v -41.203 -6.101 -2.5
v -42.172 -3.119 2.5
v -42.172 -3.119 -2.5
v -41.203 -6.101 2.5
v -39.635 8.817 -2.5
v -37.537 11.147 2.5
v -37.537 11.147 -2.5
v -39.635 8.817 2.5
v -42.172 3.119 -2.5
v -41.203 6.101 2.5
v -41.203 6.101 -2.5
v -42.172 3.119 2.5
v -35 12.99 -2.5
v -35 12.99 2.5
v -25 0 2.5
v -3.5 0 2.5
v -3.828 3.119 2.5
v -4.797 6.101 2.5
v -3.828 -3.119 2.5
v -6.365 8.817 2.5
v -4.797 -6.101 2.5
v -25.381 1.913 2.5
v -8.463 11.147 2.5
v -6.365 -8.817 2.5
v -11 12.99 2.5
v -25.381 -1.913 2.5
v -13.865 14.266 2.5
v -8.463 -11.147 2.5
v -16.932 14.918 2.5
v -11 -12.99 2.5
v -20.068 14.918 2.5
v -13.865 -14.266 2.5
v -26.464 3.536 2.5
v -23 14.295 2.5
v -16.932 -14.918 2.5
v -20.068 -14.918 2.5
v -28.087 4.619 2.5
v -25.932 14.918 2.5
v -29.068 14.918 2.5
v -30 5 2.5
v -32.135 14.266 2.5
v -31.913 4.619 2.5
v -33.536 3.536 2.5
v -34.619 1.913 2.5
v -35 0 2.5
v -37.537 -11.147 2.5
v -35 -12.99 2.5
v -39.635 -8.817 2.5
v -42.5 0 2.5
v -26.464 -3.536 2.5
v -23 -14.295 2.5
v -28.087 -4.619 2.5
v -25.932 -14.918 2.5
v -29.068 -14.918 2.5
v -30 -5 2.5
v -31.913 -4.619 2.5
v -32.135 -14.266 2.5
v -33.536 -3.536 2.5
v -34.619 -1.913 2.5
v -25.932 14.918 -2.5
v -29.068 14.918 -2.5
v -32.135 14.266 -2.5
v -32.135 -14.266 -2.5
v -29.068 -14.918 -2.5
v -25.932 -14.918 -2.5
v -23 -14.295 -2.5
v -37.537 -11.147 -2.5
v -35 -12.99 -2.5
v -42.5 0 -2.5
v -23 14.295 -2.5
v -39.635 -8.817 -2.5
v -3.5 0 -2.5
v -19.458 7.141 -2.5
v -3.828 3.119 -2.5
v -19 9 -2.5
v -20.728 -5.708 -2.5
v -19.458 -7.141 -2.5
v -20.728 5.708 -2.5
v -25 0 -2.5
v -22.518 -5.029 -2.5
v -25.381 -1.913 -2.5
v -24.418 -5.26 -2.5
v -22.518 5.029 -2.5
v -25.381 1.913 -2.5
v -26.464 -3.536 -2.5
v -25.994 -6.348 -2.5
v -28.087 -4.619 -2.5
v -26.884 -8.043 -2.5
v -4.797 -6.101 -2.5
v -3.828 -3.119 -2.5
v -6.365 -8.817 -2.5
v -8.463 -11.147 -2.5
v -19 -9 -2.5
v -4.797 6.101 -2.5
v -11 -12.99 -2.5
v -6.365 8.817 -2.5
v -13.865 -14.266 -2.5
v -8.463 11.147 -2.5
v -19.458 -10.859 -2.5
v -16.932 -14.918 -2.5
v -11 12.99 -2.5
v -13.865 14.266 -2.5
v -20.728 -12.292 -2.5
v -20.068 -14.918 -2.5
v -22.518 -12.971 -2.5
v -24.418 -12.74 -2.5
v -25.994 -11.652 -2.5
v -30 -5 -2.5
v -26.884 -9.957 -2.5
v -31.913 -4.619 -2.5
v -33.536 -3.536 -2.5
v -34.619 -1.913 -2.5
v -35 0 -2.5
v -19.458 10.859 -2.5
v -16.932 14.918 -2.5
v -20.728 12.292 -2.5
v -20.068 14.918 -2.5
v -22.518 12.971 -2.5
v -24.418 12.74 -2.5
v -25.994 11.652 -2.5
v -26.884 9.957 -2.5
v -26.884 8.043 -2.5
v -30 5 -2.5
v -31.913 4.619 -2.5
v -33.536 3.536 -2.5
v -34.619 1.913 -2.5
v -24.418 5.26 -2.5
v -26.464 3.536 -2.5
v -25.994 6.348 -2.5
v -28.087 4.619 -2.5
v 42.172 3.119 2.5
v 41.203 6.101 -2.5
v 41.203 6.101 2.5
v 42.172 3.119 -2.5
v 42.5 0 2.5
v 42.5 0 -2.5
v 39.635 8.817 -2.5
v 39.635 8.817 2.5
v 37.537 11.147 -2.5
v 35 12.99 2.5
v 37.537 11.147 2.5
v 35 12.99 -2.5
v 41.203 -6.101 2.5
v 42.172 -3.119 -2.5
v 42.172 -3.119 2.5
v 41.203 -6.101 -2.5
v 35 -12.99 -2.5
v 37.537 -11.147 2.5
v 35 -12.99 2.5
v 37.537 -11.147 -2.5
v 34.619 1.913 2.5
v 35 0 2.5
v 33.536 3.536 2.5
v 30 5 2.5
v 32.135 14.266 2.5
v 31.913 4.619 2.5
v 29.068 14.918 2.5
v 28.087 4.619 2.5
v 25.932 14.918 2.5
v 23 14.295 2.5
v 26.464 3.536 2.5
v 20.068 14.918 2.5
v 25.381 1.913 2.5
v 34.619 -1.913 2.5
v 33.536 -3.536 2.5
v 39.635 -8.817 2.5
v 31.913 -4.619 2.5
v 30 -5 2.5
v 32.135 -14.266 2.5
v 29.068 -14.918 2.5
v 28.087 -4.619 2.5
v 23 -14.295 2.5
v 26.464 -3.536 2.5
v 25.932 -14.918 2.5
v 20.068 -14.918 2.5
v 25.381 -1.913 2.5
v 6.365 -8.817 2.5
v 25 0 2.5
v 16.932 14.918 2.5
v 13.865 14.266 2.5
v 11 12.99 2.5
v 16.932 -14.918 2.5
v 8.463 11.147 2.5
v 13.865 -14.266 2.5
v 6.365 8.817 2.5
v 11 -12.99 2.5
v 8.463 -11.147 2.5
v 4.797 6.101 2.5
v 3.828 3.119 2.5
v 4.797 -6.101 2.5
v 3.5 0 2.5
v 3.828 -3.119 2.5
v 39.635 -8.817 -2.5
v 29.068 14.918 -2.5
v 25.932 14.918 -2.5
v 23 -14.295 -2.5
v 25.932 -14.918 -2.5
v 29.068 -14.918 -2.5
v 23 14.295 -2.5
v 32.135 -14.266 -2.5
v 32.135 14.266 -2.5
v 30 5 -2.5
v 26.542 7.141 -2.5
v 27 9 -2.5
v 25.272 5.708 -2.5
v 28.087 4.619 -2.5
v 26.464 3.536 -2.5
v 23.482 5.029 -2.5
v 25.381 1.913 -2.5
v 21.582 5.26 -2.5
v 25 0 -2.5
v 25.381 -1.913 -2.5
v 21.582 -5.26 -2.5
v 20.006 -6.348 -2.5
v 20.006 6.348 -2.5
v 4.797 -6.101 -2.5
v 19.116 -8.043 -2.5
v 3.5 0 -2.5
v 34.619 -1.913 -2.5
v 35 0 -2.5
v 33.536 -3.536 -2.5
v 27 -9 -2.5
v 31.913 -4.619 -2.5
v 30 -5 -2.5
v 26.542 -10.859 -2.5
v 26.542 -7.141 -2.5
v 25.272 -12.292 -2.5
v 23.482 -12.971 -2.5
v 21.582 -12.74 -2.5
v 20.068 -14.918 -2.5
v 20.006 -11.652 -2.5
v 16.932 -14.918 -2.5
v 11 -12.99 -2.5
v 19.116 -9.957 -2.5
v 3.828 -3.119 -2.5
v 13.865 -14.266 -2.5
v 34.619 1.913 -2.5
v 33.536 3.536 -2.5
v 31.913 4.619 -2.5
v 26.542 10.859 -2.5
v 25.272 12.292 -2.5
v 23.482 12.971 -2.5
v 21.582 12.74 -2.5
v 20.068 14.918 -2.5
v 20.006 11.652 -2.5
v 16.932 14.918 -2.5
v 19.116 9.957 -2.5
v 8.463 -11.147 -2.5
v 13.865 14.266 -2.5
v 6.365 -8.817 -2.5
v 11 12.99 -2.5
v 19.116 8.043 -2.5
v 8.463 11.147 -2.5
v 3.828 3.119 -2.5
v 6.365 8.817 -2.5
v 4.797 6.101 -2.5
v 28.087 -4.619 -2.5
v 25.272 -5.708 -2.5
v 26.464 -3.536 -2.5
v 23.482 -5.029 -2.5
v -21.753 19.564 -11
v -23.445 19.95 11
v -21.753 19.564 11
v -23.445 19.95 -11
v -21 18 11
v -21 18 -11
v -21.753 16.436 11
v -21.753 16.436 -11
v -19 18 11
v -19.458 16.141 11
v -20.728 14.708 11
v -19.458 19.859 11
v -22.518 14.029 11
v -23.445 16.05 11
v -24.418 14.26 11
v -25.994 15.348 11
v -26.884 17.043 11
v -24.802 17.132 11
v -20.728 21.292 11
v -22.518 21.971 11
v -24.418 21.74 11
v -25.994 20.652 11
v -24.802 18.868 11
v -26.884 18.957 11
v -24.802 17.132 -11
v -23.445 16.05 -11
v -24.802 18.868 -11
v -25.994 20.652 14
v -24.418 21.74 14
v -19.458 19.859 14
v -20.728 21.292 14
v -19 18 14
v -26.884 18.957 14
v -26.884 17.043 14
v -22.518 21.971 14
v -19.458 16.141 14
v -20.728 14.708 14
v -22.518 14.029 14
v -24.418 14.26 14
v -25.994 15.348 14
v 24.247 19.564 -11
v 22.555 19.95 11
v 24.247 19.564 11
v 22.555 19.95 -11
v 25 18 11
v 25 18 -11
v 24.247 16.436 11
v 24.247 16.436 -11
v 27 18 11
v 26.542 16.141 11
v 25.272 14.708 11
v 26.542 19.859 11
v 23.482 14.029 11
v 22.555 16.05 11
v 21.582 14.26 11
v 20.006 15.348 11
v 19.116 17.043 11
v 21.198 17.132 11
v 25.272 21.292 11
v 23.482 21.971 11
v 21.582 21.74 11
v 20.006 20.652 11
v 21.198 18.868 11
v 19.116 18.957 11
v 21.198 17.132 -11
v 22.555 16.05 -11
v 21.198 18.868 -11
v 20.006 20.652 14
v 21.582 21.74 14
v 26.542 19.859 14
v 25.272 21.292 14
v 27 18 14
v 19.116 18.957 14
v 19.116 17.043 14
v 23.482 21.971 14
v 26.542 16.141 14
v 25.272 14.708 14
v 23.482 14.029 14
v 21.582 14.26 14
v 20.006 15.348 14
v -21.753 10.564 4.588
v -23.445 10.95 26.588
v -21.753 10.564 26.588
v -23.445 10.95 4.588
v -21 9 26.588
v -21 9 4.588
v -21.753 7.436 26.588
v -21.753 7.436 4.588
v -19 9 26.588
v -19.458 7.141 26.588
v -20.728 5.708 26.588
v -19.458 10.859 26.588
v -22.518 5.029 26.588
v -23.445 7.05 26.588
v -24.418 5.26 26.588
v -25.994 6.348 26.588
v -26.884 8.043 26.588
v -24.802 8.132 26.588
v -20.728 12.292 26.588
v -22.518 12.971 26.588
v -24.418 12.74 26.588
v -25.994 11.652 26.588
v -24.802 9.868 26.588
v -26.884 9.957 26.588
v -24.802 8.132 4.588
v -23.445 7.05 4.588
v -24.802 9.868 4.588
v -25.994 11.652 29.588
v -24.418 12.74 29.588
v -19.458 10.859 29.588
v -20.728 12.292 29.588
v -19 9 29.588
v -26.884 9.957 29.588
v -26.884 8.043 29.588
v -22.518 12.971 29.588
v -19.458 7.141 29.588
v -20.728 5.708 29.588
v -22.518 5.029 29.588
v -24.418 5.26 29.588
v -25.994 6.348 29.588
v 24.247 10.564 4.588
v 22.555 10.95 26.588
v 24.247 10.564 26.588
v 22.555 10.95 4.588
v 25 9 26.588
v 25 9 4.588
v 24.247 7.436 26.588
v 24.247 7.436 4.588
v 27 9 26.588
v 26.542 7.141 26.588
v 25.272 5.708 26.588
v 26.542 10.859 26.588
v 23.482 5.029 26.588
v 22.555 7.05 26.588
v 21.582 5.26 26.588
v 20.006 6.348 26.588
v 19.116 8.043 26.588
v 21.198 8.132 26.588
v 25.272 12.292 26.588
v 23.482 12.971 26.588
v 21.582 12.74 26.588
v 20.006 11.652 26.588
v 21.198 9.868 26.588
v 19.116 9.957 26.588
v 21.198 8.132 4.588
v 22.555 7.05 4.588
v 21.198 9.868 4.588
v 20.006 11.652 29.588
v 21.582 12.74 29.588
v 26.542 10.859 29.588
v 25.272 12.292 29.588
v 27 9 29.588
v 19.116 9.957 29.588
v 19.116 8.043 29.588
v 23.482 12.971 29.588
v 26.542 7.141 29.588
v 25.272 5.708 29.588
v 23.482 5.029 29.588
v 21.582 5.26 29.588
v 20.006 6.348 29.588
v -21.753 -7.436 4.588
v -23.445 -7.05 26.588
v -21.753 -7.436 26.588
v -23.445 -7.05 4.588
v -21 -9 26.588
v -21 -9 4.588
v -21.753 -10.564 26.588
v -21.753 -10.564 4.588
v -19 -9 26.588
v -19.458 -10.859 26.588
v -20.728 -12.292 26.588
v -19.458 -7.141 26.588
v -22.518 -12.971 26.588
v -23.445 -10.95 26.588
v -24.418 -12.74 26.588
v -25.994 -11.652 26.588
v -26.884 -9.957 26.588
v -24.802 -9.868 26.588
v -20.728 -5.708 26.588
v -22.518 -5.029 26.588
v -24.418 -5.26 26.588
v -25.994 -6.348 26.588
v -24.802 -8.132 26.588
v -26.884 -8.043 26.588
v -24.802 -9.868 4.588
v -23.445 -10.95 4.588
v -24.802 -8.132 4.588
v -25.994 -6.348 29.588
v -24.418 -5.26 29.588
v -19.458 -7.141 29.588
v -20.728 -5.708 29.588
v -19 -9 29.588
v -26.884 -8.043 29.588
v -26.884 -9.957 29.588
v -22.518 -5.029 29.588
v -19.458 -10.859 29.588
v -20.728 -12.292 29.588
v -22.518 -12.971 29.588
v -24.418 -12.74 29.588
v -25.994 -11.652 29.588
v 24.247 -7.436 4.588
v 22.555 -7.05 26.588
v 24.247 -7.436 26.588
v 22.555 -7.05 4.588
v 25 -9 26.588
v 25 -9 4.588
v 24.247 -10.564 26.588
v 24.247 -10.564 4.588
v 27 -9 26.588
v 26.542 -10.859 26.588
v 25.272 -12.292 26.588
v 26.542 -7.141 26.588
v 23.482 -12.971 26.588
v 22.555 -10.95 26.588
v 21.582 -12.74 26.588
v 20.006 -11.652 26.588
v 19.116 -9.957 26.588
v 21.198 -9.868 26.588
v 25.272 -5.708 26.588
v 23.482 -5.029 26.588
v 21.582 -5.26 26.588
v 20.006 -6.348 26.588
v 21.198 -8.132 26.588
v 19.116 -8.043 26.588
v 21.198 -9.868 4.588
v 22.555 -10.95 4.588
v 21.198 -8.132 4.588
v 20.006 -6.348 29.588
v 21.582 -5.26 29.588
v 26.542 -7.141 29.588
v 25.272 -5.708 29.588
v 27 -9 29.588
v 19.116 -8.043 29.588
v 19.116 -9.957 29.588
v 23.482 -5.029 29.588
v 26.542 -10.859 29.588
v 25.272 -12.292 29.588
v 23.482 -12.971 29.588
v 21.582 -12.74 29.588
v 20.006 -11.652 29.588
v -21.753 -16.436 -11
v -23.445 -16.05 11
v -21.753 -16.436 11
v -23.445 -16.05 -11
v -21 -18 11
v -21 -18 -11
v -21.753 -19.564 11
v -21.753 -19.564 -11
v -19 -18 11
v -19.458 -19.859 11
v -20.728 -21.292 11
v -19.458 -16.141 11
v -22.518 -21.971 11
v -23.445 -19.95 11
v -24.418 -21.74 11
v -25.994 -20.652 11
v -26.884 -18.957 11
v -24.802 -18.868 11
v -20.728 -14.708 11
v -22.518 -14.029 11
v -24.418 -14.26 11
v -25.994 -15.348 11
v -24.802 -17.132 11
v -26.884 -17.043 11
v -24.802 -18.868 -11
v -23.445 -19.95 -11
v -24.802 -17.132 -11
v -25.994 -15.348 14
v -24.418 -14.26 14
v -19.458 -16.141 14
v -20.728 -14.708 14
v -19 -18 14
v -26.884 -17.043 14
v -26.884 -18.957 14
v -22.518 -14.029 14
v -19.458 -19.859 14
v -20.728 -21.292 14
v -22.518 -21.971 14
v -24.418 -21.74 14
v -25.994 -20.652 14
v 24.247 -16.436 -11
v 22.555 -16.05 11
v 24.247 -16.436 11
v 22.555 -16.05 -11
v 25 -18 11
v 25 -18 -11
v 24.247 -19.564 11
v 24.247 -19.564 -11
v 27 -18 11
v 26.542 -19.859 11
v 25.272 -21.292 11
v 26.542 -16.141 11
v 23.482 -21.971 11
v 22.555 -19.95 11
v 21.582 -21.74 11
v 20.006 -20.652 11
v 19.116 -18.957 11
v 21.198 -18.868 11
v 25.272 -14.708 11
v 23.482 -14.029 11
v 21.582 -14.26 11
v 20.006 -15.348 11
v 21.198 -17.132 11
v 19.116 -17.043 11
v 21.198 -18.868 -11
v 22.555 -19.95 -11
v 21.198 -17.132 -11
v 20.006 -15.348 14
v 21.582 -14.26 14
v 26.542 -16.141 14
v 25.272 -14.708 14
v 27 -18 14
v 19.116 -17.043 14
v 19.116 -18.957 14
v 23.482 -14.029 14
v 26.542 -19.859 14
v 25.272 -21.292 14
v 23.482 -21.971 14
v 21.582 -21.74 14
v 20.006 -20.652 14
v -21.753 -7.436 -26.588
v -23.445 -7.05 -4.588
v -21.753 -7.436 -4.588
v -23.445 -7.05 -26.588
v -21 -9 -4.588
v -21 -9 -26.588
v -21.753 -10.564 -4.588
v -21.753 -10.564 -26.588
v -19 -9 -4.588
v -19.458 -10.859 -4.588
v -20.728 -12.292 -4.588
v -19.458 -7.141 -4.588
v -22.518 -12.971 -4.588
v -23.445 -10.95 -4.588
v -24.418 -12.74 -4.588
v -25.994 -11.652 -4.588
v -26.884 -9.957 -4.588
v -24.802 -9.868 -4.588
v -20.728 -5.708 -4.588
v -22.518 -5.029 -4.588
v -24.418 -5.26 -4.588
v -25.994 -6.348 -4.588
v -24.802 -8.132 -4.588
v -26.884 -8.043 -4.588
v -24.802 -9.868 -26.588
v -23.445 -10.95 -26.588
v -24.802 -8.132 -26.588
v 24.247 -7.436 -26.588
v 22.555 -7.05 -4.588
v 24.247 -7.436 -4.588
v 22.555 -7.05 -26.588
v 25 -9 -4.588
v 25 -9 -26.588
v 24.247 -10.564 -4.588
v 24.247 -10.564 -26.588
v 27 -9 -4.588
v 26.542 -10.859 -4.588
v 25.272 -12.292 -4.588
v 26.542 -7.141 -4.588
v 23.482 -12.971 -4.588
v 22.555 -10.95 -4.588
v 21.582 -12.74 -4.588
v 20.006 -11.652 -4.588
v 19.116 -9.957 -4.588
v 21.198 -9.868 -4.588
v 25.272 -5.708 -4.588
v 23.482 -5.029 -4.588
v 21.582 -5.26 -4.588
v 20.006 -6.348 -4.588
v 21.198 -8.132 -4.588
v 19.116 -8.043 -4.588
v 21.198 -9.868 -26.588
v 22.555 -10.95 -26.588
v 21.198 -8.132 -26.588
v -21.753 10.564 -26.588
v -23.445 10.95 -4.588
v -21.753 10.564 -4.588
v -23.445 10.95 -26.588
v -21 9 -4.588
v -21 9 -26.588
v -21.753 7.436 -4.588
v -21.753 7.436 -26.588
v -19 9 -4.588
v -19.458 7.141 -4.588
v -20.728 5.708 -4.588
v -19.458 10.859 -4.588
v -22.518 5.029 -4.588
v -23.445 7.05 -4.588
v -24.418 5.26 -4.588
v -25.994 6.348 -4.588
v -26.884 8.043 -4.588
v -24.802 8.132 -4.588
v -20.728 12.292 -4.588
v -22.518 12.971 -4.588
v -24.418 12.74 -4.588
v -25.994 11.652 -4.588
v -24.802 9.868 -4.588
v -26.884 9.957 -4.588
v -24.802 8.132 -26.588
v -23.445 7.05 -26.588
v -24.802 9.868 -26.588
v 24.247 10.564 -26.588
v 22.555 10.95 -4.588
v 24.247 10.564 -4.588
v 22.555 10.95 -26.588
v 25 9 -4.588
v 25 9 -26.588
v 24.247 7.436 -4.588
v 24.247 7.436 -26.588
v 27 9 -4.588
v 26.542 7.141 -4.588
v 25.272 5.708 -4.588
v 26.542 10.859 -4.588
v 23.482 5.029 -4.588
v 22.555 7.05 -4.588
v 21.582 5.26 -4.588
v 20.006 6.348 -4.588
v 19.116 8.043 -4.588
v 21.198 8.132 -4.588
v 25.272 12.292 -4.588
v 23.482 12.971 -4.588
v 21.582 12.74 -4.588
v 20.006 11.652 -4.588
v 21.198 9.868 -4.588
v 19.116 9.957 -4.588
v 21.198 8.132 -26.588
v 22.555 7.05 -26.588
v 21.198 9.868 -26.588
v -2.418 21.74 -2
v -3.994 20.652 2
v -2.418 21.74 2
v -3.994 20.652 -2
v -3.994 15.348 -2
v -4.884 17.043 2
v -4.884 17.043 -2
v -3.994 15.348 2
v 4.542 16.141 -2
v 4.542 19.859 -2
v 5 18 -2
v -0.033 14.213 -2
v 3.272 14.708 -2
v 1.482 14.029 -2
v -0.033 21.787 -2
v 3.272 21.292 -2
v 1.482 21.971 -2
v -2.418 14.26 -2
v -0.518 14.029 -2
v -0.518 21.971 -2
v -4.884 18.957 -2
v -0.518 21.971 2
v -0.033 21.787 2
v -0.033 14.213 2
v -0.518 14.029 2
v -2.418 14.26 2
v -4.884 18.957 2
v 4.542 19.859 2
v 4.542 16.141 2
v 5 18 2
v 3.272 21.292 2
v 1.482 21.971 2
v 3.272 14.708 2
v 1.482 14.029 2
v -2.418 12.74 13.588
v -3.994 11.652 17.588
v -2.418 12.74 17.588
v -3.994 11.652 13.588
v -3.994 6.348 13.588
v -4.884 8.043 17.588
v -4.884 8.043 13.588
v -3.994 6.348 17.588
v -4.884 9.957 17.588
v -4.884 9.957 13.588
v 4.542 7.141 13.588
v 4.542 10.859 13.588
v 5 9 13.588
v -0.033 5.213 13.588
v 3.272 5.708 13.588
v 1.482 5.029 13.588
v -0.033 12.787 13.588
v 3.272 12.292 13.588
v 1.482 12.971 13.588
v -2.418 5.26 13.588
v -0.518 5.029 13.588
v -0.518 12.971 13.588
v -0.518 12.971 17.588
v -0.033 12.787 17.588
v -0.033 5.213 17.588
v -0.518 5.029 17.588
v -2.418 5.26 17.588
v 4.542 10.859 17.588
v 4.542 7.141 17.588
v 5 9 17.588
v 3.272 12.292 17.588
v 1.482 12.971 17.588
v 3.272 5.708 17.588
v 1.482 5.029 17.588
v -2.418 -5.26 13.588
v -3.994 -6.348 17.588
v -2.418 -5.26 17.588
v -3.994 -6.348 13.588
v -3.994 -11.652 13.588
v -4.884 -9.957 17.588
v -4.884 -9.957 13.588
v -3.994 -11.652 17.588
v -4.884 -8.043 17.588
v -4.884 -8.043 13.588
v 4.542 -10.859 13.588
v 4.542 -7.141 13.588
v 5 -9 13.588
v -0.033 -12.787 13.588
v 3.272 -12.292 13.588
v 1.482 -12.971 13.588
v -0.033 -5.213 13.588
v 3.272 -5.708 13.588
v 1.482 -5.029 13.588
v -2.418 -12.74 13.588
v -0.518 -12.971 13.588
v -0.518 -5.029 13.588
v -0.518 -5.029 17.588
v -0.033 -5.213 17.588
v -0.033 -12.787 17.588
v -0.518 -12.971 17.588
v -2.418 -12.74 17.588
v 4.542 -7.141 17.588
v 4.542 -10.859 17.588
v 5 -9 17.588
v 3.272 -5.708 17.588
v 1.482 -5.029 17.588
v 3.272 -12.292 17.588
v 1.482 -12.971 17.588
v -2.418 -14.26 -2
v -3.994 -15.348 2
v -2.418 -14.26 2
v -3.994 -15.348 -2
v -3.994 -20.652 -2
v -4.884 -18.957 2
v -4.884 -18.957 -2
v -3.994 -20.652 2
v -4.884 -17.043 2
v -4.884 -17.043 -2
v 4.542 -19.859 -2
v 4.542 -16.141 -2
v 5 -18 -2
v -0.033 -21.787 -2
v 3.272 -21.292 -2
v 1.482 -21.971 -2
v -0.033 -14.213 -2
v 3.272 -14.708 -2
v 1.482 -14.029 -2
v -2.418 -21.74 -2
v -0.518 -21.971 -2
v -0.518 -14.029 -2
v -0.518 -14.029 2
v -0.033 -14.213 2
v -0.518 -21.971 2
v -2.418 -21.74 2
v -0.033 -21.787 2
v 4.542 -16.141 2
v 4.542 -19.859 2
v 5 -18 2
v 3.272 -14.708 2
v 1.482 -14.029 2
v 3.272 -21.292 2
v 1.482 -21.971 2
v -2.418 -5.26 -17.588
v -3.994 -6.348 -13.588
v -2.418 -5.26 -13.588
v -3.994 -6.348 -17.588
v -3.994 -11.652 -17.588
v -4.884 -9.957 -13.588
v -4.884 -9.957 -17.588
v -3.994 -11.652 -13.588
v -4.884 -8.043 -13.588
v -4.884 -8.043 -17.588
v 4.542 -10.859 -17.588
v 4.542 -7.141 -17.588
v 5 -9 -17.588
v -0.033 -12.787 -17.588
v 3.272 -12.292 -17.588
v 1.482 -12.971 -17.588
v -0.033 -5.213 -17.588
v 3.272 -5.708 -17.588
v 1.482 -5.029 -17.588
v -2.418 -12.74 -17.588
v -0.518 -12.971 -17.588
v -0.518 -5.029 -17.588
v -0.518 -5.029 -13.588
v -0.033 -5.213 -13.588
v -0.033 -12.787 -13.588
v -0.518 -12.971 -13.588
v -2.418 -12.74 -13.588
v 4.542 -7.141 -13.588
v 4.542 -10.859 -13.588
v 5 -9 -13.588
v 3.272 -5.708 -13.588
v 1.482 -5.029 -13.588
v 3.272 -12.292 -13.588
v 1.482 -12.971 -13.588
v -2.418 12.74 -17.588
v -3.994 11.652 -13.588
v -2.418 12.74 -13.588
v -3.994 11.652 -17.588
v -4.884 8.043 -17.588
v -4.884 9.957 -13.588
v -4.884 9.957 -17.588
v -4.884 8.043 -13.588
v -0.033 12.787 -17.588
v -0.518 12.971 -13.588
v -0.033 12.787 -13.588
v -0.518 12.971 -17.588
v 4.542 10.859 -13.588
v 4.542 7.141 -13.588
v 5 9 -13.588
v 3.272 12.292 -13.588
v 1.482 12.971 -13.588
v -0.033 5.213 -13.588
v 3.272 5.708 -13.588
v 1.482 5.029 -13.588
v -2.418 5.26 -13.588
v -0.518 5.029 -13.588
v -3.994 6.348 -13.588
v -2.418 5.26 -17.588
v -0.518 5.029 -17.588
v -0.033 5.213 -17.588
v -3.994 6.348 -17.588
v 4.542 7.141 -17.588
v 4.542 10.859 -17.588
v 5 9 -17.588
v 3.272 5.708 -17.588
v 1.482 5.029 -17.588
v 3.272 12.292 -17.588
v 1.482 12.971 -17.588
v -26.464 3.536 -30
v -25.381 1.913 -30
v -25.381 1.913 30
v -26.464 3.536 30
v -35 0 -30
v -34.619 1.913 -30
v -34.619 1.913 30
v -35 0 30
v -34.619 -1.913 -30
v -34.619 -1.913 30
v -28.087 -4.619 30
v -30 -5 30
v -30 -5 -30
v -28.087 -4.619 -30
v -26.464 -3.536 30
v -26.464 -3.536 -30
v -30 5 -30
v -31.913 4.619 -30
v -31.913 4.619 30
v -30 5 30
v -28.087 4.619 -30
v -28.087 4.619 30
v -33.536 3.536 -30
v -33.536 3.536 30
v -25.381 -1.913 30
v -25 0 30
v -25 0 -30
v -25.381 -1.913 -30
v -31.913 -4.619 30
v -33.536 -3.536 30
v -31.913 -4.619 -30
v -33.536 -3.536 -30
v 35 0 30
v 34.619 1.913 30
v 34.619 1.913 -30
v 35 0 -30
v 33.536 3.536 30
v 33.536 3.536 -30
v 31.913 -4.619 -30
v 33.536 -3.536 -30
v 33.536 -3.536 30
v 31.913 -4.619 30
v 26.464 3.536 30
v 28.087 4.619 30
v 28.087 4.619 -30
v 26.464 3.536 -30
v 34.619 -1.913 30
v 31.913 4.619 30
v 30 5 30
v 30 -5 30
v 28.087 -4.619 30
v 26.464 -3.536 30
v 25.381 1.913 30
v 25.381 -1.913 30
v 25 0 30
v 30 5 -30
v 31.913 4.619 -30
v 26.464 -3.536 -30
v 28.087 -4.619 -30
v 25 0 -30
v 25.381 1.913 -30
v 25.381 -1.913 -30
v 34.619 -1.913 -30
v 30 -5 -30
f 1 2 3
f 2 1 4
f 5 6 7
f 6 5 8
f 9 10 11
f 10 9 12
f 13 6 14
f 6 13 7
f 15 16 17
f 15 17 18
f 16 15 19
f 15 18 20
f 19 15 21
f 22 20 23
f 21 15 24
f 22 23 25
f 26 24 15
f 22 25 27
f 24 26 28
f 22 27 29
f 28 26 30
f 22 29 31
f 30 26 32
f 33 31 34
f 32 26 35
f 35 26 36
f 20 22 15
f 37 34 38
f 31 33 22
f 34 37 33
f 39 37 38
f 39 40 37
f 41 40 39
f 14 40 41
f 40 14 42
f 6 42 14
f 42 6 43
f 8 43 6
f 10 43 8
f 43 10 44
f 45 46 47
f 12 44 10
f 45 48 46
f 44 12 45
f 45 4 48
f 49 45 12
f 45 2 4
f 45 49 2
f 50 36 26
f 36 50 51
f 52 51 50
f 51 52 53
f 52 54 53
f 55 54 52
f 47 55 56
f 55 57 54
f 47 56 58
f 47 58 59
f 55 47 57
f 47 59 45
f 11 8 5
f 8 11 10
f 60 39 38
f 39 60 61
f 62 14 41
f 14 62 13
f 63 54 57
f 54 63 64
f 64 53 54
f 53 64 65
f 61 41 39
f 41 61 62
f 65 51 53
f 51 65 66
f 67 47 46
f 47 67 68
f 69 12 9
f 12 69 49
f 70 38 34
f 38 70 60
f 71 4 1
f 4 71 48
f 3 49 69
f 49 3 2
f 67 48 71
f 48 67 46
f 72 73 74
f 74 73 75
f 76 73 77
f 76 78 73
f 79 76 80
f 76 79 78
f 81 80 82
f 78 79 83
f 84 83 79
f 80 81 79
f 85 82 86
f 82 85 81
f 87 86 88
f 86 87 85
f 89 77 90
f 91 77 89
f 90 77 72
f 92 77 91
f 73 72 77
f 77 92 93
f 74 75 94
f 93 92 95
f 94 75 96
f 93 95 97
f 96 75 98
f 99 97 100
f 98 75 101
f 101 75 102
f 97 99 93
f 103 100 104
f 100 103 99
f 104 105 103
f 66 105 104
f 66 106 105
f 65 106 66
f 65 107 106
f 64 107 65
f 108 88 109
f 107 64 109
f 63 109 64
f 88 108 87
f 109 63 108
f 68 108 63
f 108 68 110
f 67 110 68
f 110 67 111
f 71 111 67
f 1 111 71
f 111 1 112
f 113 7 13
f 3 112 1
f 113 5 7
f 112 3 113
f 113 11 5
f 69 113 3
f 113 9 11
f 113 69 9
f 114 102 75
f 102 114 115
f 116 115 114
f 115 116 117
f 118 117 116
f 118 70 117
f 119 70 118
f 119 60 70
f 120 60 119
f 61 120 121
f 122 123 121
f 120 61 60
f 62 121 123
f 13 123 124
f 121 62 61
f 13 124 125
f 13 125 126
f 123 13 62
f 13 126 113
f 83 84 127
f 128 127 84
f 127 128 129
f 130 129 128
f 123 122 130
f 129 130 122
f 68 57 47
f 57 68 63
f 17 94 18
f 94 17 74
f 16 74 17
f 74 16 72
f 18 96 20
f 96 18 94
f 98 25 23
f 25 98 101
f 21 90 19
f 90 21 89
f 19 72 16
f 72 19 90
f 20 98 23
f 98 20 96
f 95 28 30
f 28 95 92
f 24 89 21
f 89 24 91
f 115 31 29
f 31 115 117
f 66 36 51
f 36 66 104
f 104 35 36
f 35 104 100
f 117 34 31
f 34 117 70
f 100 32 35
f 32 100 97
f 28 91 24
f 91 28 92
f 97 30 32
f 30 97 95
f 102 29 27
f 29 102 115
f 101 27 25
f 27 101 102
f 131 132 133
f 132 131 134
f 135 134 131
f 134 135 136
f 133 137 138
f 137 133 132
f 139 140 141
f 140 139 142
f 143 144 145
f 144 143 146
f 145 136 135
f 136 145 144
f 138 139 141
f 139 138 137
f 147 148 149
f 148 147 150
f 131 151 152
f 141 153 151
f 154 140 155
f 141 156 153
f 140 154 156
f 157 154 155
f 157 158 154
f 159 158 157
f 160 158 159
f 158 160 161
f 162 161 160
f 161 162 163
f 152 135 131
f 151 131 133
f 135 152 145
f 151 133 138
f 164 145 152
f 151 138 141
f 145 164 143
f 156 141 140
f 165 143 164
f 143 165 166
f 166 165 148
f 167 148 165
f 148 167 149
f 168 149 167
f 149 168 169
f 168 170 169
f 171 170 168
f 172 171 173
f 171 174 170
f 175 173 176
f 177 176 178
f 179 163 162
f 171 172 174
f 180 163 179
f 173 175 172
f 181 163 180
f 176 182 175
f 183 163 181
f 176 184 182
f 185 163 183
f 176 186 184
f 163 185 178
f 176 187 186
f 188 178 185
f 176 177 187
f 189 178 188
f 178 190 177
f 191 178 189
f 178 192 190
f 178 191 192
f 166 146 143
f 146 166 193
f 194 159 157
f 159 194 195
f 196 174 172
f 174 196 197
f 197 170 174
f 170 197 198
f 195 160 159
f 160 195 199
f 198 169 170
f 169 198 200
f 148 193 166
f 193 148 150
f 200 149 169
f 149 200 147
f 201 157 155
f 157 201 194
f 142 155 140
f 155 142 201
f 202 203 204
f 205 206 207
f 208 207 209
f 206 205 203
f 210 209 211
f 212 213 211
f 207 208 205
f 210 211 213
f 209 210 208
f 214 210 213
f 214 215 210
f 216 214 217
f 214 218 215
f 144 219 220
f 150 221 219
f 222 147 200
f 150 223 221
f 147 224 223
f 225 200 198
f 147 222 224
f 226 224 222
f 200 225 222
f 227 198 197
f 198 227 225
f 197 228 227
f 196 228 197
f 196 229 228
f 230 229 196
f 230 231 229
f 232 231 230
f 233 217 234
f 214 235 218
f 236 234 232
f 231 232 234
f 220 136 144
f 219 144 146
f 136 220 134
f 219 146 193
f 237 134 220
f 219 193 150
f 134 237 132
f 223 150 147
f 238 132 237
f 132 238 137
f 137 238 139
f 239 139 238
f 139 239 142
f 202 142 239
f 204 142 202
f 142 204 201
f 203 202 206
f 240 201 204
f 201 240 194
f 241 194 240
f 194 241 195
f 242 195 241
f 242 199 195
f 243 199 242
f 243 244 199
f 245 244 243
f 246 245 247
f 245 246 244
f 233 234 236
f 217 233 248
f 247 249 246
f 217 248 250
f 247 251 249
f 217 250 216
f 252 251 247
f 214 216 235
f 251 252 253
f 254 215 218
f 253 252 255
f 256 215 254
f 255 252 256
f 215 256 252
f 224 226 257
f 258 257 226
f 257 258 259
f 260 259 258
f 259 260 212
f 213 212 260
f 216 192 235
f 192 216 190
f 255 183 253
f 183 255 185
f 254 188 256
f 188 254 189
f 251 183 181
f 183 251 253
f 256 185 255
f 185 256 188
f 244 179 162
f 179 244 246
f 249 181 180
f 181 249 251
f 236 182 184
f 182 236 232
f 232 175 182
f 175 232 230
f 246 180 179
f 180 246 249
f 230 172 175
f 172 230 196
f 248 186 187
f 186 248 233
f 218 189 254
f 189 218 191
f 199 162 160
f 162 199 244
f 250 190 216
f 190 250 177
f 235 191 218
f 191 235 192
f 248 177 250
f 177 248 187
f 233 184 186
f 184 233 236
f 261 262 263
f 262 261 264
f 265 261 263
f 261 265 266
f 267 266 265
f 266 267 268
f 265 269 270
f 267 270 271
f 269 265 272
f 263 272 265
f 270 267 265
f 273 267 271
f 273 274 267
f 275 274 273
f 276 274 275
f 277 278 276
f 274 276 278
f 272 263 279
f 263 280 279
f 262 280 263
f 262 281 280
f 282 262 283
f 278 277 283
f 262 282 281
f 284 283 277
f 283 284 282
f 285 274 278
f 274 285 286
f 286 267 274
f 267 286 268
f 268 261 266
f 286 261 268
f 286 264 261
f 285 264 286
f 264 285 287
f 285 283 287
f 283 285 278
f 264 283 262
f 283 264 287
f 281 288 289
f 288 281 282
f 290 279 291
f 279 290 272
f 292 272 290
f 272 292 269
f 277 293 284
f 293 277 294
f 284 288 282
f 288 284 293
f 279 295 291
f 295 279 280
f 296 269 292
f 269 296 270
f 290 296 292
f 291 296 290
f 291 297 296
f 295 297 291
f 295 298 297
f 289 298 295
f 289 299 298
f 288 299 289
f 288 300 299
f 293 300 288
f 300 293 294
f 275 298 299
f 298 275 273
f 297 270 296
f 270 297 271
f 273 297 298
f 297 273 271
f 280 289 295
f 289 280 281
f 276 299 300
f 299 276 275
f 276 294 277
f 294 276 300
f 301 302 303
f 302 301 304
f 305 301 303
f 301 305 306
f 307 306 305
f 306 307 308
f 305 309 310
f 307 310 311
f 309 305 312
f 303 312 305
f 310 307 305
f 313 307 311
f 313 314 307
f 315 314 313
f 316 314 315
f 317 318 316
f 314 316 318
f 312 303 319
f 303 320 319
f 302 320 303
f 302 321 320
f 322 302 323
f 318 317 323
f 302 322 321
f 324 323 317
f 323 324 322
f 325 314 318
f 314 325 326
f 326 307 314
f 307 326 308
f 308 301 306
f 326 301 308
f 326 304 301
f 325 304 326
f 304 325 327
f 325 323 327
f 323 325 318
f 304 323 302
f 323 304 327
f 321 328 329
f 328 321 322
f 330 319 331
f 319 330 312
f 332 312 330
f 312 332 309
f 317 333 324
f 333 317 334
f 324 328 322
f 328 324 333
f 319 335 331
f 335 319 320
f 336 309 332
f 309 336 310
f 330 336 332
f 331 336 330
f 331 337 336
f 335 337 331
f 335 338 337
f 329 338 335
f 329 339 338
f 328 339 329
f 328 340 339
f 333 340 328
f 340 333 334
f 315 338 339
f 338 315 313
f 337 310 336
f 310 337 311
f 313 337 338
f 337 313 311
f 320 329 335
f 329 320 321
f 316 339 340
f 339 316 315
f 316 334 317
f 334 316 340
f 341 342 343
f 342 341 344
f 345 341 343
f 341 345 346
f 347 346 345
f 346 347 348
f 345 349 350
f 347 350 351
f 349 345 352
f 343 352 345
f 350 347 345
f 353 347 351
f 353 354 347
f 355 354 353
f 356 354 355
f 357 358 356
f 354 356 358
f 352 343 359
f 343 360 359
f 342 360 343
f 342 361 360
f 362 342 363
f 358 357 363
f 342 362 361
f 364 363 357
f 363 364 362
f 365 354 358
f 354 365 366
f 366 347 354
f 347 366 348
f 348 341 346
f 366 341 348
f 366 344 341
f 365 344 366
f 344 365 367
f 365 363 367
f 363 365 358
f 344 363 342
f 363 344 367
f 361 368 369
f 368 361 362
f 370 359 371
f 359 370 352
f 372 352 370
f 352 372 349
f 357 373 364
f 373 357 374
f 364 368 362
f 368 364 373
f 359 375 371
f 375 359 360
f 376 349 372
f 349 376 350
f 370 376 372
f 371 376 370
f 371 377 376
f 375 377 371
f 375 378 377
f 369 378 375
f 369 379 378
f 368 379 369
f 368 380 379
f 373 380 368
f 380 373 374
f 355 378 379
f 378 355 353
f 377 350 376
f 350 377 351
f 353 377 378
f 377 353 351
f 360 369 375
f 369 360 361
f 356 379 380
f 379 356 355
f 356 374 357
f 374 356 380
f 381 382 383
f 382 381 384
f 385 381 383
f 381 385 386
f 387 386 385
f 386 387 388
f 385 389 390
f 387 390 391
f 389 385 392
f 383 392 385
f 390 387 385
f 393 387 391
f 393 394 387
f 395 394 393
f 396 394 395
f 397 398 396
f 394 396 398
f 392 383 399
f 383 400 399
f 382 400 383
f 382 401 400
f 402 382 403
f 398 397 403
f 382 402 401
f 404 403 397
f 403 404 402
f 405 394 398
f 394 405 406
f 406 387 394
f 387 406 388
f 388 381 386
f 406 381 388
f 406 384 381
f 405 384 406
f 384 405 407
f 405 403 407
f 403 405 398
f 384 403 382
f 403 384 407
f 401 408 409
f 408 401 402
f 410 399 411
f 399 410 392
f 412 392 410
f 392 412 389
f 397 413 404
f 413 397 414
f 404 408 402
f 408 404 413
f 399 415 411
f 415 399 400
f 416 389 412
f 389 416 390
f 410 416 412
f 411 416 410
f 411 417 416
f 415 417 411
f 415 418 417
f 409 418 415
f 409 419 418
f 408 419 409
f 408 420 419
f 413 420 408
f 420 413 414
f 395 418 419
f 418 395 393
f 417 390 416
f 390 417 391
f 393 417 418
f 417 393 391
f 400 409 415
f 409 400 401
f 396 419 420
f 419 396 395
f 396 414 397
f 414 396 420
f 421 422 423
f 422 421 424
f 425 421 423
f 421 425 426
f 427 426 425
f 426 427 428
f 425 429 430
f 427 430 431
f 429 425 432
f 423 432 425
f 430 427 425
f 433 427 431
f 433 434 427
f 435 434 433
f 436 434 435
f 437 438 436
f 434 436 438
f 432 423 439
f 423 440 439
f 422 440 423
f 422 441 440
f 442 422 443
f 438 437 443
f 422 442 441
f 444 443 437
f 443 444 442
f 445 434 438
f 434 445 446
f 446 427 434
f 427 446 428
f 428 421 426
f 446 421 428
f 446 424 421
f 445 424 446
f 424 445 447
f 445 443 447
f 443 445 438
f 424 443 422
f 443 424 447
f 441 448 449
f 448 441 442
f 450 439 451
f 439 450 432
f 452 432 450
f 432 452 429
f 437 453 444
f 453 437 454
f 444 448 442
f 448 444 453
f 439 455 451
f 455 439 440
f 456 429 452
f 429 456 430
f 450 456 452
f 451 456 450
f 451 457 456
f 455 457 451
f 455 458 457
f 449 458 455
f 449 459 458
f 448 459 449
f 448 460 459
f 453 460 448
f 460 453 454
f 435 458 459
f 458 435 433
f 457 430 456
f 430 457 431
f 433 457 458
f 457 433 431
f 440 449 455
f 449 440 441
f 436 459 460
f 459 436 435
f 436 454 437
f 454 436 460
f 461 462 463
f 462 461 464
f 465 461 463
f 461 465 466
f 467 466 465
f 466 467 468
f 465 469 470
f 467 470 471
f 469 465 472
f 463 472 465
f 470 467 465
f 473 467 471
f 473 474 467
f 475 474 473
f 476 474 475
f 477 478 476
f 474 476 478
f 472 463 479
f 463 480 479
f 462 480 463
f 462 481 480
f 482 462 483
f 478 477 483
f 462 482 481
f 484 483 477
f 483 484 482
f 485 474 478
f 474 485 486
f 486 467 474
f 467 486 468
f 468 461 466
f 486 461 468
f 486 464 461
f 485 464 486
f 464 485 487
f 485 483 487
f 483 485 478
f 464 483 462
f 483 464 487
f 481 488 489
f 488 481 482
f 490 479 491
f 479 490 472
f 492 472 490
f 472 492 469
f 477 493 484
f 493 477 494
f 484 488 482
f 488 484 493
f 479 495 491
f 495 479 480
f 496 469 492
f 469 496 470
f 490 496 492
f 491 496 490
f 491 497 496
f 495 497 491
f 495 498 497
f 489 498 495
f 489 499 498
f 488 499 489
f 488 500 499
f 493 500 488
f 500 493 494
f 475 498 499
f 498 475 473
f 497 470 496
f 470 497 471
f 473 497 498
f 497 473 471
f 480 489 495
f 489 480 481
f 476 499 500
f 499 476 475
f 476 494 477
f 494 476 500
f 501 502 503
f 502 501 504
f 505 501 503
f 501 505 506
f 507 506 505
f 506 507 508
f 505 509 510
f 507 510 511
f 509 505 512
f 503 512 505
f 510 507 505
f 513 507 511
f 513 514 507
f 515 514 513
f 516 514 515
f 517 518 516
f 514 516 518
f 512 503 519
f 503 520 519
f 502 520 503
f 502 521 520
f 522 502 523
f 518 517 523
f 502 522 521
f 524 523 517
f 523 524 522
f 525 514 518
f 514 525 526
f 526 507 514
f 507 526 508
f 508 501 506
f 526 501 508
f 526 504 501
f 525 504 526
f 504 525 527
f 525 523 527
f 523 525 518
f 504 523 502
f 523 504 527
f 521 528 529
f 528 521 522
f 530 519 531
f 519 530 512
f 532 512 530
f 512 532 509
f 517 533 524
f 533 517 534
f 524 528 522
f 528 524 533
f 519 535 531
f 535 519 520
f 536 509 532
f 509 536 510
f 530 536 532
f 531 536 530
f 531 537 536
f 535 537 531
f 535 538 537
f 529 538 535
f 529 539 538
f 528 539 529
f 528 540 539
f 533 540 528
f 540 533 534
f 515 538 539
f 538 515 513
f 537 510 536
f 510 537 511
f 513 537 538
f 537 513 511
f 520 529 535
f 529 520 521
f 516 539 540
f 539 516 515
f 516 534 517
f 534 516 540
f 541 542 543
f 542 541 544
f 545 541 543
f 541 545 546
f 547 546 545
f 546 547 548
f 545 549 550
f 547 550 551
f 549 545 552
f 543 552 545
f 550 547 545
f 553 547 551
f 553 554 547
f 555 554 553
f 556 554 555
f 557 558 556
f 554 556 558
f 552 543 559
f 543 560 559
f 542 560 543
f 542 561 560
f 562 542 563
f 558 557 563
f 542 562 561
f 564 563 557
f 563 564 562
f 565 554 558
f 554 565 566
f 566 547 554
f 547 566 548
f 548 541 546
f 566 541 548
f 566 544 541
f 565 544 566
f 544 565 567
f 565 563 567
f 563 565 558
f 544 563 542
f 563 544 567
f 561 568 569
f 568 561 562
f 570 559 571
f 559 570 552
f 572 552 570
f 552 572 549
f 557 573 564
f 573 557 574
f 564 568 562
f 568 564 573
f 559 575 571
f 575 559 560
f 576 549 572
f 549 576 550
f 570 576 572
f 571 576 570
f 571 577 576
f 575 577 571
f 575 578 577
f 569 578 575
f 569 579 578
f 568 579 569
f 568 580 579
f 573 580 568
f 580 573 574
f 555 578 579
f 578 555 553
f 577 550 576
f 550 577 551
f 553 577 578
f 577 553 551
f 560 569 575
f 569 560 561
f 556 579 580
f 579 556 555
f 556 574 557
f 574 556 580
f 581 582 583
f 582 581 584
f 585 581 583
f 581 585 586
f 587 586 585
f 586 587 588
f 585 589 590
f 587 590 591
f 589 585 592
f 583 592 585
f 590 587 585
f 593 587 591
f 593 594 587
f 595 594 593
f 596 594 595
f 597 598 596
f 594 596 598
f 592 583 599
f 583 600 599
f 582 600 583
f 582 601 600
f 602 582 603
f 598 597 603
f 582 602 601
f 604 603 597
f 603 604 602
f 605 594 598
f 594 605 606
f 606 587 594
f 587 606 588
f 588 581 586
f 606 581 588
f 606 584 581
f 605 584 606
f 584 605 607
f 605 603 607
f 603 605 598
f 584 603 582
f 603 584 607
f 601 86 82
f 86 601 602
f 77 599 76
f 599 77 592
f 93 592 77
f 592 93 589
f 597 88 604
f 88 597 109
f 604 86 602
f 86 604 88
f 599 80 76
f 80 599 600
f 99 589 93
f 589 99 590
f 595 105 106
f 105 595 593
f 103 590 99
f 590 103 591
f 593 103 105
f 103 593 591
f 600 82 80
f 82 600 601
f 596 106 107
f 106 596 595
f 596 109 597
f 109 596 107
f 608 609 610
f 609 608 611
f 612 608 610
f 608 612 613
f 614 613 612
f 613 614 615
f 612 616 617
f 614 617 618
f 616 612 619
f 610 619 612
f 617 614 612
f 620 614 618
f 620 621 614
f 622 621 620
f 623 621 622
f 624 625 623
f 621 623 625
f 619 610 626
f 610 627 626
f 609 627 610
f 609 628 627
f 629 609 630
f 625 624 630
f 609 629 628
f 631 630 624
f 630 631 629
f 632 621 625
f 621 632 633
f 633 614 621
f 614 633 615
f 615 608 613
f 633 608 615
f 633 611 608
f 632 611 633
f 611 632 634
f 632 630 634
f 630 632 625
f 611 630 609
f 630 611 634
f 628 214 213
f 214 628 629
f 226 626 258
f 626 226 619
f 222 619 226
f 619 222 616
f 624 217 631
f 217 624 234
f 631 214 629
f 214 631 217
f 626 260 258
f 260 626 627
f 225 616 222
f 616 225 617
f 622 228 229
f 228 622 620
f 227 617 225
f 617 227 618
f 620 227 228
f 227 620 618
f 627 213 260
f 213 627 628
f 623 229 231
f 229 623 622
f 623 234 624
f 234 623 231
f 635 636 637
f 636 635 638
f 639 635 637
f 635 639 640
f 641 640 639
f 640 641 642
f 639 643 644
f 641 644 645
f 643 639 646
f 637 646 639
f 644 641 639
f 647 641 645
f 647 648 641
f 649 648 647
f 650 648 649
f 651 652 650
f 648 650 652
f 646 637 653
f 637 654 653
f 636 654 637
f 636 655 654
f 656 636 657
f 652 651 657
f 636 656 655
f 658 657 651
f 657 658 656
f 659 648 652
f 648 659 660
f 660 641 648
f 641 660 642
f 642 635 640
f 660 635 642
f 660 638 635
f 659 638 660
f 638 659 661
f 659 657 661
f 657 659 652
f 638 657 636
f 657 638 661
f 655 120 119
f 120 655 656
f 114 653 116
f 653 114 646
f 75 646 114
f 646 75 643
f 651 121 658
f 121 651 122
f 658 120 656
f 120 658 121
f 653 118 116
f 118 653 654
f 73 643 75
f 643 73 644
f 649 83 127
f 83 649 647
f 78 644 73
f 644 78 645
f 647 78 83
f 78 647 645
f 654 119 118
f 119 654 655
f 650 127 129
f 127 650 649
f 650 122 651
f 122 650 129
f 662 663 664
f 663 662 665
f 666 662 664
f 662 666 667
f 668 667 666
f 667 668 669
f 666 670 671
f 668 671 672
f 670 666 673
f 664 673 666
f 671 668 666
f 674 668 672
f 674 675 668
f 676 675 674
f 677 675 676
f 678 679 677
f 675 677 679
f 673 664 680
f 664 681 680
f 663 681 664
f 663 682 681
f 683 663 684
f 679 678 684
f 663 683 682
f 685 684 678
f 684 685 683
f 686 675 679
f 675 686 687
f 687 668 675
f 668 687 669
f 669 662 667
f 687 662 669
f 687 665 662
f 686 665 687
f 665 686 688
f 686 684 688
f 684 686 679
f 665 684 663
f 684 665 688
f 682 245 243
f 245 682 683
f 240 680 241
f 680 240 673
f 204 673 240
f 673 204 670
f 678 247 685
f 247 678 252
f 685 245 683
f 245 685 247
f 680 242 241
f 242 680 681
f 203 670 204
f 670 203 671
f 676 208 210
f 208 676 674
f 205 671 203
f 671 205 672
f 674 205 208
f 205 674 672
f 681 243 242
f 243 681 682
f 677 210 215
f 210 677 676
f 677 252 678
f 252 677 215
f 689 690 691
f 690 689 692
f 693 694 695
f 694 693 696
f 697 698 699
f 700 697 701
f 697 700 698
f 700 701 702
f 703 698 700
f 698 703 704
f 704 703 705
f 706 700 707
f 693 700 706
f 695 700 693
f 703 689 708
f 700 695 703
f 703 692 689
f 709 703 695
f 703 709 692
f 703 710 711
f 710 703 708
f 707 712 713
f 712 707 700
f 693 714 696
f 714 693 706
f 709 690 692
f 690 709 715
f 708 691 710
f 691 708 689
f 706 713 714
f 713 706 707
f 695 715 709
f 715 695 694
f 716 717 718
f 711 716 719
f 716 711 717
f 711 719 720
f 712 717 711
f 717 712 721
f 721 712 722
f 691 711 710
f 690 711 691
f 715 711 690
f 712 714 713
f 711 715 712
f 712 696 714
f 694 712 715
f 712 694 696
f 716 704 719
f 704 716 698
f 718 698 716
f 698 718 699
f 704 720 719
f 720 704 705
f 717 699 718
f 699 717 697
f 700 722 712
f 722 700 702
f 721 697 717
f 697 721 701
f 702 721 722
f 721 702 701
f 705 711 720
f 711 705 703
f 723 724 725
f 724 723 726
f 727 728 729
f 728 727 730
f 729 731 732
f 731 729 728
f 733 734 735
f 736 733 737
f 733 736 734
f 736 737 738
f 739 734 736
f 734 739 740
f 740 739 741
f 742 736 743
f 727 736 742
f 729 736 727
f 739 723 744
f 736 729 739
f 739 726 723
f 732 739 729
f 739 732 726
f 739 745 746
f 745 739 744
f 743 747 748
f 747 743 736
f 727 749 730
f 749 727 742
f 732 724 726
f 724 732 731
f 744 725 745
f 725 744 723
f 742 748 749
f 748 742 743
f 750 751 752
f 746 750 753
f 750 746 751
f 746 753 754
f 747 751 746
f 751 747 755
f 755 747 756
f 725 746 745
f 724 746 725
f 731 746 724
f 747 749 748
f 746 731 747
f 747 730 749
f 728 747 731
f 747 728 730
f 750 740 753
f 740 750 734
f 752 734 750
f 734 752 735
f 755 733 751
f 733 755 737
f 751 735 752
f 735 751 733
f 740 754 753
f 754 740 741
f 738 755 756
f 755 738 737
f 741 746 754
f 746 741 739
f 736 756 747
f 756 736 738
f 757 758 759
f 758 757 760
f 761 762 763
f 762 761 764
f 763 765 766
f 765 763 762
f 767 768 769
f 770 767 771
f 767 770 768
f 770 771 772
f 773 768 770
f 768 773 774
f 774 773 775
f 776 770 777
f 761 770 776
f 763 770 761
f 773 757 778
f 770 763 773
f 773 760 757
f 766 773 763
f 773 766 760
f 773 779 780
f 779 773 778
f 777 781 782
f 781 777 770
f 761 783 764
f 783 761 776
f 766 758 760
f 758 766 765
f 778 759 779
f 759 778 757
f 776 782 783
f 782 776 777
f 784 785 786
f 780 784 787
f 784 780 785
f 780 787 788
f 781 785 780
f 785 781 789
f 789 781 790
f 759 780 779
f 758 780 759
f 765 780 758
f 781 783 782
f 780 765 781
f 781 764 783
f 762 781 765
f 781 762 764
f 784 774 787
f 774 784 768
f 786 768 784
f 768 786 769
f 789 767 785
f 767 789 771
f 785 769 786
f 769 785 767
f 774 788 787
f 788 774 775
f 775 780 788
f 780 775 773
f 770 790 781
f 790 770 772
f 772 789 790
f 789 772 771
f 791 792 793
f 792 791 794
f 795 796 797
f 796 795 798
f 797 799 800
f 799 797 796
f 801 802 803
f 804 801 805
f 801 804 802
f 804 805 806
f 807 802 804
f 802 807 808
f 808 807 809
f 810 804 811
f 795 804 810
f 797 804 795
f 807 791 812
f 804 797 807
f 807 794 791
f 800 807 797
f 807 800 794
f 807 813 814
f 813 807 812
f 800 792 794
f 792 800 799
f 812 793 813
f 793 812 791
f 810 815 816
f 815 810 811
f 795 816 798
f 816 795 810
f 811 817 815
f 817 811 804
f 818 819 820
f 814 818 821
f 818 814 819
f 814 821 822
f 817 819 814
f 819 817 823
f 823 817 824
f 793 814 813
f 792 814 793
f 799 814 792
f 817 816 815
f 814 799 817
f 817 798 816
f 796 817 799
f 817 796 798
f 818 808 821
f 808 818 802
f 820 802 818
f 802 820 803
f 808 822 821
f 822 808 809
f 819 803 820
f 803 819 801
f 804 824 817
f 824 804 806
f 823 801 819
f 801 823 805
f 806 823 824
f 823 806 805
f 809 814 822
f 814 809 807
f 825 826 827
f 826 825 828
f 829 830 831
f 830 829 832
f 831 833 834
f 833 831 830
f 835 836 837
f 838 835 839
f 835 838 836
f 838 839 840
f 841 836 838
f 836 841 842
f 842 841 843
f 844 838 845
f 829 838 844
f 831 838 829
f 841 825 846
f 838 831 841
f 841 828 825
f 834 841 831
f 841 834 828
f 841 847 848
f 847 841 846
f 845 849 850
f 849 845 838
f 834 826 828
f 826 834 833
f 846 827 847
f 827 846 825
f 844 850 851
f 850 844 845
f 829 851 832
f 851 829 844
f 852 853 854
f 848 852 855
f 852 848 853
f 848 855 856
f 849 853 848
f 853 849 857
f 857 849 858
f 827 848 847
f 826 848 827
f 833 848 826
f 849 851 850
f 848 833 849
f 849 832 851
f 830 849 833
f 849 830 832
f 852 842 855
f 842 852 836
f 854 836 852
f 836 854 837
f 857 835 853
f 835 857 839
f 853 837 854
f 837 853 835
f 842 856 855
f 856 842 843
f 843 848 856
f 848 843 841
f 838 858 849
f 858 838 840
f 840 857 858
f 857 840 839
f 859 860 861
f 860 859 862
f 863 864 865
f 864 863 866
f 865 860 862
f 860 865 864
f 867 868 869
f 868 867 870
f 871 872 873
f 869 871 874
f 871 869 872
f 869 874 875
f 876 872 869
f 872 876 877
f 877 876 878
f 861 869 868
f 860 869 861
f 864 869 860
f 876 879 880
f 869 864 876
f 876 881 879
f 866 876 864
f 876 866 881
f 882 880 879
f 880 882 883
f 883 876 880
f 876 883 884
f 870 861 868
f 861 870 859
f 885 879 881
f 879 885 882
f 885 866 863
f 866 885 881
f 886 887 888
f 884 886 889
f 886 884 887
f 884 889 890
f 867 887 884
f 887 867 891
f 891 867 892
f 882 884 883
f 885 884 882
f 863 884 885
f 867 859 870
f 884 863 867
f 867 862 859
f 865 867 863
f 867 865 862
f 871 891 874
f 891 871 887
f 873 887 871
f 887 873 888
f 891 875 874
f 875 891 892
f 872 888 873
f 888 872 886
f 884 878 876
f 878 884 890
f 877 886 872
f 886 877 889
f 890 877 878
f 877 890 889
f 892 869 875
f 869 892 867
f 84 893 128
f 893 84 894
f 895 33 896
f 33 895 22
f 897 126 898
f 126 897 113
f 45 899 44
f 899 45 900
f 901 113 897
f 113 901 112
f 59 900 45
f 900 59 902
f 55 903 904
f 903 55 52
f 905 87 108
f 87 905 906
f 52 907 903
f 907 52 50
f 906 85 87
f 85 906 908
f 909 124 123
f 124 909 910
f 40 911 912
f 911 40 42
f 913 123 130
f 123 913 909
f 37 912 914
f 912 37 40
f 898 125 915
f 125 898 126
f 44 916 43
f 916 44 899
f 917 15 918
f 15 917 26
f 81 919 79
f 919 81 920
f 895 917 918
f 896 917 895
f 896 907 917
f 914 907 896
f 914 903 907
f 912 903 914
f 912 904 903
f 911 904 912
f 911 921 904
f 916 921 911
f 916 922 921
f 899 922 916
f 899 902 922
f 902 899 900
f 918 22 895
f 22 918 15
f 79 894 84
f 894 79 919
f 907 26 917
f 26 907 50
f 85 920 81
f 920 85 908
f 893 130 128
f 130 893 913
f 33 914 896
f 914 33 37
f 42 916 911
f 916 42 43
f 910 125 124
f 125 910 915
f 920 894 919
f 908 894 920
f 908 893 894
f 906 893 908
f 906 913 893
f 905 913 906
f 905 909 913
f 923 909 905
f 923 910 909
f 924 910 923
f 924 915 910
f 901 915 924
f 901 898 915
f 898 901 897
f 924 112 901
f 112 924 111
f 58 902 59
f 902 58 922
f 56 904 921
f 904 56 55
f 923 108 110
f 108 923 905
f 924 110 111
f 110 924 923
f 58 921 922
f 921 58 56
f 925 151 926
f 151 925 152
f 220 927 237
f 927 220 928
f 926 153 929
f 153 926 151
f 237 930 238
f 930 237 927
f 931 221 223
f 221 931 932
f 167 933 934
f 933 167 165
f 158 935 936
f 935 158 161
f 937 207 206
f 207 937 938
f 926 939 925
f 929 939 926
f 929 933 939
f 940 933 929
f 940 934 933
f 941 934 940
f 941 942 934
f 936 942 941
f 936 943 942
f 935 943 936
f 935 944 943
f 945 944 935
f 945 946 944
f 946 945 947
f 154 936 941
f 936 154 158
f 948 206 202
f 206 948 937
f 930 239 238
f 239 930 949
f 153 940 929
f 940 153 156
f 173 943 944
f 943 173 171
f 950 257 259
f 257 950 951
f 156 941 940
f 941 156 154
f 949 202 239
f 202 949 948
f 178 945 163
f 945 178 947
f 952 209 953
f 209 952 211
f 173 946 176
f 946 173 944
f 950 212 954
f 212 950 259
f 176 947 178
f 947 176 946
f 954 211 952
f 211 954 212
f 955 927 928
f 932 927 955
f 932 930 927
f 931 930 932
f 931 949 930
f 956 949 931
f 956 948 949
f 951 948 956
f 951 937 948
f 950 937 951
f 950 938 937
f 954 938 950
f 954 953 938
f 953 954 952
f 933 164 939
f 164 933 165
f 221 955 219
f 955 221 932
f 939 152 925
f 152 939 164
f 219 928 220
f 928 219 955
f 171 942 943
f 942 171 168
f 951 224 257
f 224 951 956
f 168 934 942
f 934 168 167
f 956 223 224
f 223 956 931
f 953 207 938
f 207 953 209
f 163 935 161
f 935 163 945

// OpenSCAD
// Parameters
shaft_diameter = 10; // Adjusted to match original model
shaft_length = 60; // Extended for proper alignment
flange_diameter = 30; // Adjusted to match original model
flange_thickness = 5; // Adjusted for correct proportion
spacer_diameter = 25; // Increased to match original model
spacer_thickness = 4; // Adjusted for correct separation
bolt_diameter = 4; // Adjusted for better fit
bolt_length = 22; // Extended for proper securing
nut_diameter = 8; // Adjusted for proper fit
nut_thickness = 4; // Adjusted for correct proportion
hole_spacing = 18; // Adjusted for correct bolt placement
num_bolts = 6; // Increased to match original model

// Function to create a shaft
module shaft(length) {
    cylinder(h=length, d=shaft_diameter, center=true);
}

// Function to create a flange plate
module flange_plate() {
    difference() {
        cylinder(h=flange_thickness, d=flange_diameter, center=true);
        for (i = [0:num_bolts-1]) {
            angle = i * 360 / num_bolts;
            translate([hole_spacing * cos(angle), hole_spacing * sin(angle), 0])
                cylinder(h=flange_thickness+2, d=bolt_diameter, center=true);
        }
    }
}

// Function to create a spacer ring
module spacer_ring() {
    difference() {
        cylinder(h=spacer_thickness, d=spacer_diameter, center=true);
        for (i = [0:num_bolts-1]) {
            angle = i * 360 / num_bolts;
            translate([hole_spacing * cos(angle), hole_spacing * sin(angle), 0])
                cylinder(h=spacer_thickness+2, d=bolt_diameter, center=true);
        }
    }
}

// Function to create a bolt with a hexagonal head
module bolt() {
    translate([0, 0, -bolt_length/2])
        cylinder(h=bolt_length, d=bolt_diameter, center=false);
    translate([0, 0, bolt_length/2])
        cylinder(h=3, d1=8, d2=8, center=false); // Hexagonal head
}

// Function to create a nut
module nut() {
    cylinder(h=nut_thickness, d=nut_diameter, center=true);
}

// Assembly
module flexible_coupling() {
    translate([-shaft_length/2, 0, 0]) shaft(shaft_length);
    translate([shaft_length/2, 0, 0]) shaft(shaft_length);
    
    translate([-shaft_length/2 + flange_thickness/2, 0, 0]) flange_plate();
    translate([-shaft_length/2 + flange_thickness + spacer_thickness/2, 0, 0]) spacer_ring();
    translate([-shaft_length/2 + flange_thickness + spacer_thickness + flange_thickness/2, 0, 0]) flange_plate();
    
    translate([shaft_length/2 - flange_thickness/2, 0, 0]) flange_plate();
    translate([shaft_length/2 - flange_thickness - spacer_thickness/2, 0, 0]) spacer_ring();
    translate([shaft_length/2 - flange_thickness - spacer_thickness - flange_thickness/2, 0, 0]) flange_plate();
    
    for (i = [0:num_bolts-1]) {
        angle = i * 360 / num_bolts;
        translate([-shaft_length/2 + flange_thickness + spacer_thickness/2, hole_spacing * cos(angle), hole_spacing * sin(angle)])
            bolt();
        translate([shaft_length/2 - flange_thickness - spacer_thickness/2, hole_spacing * cos(angle), hole_spacing * sin(angle)])
            bolt();
    }
    
    for (i = [0:num_bolts-1]) {
        angle = i * 360 / num_bolts;
        translate([-shaft_length/2 + flange_thickness + spacer_thickness/2 + bolt_length, hole_spacing * cos(angle), hole_spacing * sin(angle)])
            nut();
        translate([shaft_length/2 - flange_thickness - spacer_thickness/2 - bolt_length, hole_spacing * cos(angle), hole_spacing * sin(angle)])
            nut();
    }
}

// Render the model
flexible_coupling();
